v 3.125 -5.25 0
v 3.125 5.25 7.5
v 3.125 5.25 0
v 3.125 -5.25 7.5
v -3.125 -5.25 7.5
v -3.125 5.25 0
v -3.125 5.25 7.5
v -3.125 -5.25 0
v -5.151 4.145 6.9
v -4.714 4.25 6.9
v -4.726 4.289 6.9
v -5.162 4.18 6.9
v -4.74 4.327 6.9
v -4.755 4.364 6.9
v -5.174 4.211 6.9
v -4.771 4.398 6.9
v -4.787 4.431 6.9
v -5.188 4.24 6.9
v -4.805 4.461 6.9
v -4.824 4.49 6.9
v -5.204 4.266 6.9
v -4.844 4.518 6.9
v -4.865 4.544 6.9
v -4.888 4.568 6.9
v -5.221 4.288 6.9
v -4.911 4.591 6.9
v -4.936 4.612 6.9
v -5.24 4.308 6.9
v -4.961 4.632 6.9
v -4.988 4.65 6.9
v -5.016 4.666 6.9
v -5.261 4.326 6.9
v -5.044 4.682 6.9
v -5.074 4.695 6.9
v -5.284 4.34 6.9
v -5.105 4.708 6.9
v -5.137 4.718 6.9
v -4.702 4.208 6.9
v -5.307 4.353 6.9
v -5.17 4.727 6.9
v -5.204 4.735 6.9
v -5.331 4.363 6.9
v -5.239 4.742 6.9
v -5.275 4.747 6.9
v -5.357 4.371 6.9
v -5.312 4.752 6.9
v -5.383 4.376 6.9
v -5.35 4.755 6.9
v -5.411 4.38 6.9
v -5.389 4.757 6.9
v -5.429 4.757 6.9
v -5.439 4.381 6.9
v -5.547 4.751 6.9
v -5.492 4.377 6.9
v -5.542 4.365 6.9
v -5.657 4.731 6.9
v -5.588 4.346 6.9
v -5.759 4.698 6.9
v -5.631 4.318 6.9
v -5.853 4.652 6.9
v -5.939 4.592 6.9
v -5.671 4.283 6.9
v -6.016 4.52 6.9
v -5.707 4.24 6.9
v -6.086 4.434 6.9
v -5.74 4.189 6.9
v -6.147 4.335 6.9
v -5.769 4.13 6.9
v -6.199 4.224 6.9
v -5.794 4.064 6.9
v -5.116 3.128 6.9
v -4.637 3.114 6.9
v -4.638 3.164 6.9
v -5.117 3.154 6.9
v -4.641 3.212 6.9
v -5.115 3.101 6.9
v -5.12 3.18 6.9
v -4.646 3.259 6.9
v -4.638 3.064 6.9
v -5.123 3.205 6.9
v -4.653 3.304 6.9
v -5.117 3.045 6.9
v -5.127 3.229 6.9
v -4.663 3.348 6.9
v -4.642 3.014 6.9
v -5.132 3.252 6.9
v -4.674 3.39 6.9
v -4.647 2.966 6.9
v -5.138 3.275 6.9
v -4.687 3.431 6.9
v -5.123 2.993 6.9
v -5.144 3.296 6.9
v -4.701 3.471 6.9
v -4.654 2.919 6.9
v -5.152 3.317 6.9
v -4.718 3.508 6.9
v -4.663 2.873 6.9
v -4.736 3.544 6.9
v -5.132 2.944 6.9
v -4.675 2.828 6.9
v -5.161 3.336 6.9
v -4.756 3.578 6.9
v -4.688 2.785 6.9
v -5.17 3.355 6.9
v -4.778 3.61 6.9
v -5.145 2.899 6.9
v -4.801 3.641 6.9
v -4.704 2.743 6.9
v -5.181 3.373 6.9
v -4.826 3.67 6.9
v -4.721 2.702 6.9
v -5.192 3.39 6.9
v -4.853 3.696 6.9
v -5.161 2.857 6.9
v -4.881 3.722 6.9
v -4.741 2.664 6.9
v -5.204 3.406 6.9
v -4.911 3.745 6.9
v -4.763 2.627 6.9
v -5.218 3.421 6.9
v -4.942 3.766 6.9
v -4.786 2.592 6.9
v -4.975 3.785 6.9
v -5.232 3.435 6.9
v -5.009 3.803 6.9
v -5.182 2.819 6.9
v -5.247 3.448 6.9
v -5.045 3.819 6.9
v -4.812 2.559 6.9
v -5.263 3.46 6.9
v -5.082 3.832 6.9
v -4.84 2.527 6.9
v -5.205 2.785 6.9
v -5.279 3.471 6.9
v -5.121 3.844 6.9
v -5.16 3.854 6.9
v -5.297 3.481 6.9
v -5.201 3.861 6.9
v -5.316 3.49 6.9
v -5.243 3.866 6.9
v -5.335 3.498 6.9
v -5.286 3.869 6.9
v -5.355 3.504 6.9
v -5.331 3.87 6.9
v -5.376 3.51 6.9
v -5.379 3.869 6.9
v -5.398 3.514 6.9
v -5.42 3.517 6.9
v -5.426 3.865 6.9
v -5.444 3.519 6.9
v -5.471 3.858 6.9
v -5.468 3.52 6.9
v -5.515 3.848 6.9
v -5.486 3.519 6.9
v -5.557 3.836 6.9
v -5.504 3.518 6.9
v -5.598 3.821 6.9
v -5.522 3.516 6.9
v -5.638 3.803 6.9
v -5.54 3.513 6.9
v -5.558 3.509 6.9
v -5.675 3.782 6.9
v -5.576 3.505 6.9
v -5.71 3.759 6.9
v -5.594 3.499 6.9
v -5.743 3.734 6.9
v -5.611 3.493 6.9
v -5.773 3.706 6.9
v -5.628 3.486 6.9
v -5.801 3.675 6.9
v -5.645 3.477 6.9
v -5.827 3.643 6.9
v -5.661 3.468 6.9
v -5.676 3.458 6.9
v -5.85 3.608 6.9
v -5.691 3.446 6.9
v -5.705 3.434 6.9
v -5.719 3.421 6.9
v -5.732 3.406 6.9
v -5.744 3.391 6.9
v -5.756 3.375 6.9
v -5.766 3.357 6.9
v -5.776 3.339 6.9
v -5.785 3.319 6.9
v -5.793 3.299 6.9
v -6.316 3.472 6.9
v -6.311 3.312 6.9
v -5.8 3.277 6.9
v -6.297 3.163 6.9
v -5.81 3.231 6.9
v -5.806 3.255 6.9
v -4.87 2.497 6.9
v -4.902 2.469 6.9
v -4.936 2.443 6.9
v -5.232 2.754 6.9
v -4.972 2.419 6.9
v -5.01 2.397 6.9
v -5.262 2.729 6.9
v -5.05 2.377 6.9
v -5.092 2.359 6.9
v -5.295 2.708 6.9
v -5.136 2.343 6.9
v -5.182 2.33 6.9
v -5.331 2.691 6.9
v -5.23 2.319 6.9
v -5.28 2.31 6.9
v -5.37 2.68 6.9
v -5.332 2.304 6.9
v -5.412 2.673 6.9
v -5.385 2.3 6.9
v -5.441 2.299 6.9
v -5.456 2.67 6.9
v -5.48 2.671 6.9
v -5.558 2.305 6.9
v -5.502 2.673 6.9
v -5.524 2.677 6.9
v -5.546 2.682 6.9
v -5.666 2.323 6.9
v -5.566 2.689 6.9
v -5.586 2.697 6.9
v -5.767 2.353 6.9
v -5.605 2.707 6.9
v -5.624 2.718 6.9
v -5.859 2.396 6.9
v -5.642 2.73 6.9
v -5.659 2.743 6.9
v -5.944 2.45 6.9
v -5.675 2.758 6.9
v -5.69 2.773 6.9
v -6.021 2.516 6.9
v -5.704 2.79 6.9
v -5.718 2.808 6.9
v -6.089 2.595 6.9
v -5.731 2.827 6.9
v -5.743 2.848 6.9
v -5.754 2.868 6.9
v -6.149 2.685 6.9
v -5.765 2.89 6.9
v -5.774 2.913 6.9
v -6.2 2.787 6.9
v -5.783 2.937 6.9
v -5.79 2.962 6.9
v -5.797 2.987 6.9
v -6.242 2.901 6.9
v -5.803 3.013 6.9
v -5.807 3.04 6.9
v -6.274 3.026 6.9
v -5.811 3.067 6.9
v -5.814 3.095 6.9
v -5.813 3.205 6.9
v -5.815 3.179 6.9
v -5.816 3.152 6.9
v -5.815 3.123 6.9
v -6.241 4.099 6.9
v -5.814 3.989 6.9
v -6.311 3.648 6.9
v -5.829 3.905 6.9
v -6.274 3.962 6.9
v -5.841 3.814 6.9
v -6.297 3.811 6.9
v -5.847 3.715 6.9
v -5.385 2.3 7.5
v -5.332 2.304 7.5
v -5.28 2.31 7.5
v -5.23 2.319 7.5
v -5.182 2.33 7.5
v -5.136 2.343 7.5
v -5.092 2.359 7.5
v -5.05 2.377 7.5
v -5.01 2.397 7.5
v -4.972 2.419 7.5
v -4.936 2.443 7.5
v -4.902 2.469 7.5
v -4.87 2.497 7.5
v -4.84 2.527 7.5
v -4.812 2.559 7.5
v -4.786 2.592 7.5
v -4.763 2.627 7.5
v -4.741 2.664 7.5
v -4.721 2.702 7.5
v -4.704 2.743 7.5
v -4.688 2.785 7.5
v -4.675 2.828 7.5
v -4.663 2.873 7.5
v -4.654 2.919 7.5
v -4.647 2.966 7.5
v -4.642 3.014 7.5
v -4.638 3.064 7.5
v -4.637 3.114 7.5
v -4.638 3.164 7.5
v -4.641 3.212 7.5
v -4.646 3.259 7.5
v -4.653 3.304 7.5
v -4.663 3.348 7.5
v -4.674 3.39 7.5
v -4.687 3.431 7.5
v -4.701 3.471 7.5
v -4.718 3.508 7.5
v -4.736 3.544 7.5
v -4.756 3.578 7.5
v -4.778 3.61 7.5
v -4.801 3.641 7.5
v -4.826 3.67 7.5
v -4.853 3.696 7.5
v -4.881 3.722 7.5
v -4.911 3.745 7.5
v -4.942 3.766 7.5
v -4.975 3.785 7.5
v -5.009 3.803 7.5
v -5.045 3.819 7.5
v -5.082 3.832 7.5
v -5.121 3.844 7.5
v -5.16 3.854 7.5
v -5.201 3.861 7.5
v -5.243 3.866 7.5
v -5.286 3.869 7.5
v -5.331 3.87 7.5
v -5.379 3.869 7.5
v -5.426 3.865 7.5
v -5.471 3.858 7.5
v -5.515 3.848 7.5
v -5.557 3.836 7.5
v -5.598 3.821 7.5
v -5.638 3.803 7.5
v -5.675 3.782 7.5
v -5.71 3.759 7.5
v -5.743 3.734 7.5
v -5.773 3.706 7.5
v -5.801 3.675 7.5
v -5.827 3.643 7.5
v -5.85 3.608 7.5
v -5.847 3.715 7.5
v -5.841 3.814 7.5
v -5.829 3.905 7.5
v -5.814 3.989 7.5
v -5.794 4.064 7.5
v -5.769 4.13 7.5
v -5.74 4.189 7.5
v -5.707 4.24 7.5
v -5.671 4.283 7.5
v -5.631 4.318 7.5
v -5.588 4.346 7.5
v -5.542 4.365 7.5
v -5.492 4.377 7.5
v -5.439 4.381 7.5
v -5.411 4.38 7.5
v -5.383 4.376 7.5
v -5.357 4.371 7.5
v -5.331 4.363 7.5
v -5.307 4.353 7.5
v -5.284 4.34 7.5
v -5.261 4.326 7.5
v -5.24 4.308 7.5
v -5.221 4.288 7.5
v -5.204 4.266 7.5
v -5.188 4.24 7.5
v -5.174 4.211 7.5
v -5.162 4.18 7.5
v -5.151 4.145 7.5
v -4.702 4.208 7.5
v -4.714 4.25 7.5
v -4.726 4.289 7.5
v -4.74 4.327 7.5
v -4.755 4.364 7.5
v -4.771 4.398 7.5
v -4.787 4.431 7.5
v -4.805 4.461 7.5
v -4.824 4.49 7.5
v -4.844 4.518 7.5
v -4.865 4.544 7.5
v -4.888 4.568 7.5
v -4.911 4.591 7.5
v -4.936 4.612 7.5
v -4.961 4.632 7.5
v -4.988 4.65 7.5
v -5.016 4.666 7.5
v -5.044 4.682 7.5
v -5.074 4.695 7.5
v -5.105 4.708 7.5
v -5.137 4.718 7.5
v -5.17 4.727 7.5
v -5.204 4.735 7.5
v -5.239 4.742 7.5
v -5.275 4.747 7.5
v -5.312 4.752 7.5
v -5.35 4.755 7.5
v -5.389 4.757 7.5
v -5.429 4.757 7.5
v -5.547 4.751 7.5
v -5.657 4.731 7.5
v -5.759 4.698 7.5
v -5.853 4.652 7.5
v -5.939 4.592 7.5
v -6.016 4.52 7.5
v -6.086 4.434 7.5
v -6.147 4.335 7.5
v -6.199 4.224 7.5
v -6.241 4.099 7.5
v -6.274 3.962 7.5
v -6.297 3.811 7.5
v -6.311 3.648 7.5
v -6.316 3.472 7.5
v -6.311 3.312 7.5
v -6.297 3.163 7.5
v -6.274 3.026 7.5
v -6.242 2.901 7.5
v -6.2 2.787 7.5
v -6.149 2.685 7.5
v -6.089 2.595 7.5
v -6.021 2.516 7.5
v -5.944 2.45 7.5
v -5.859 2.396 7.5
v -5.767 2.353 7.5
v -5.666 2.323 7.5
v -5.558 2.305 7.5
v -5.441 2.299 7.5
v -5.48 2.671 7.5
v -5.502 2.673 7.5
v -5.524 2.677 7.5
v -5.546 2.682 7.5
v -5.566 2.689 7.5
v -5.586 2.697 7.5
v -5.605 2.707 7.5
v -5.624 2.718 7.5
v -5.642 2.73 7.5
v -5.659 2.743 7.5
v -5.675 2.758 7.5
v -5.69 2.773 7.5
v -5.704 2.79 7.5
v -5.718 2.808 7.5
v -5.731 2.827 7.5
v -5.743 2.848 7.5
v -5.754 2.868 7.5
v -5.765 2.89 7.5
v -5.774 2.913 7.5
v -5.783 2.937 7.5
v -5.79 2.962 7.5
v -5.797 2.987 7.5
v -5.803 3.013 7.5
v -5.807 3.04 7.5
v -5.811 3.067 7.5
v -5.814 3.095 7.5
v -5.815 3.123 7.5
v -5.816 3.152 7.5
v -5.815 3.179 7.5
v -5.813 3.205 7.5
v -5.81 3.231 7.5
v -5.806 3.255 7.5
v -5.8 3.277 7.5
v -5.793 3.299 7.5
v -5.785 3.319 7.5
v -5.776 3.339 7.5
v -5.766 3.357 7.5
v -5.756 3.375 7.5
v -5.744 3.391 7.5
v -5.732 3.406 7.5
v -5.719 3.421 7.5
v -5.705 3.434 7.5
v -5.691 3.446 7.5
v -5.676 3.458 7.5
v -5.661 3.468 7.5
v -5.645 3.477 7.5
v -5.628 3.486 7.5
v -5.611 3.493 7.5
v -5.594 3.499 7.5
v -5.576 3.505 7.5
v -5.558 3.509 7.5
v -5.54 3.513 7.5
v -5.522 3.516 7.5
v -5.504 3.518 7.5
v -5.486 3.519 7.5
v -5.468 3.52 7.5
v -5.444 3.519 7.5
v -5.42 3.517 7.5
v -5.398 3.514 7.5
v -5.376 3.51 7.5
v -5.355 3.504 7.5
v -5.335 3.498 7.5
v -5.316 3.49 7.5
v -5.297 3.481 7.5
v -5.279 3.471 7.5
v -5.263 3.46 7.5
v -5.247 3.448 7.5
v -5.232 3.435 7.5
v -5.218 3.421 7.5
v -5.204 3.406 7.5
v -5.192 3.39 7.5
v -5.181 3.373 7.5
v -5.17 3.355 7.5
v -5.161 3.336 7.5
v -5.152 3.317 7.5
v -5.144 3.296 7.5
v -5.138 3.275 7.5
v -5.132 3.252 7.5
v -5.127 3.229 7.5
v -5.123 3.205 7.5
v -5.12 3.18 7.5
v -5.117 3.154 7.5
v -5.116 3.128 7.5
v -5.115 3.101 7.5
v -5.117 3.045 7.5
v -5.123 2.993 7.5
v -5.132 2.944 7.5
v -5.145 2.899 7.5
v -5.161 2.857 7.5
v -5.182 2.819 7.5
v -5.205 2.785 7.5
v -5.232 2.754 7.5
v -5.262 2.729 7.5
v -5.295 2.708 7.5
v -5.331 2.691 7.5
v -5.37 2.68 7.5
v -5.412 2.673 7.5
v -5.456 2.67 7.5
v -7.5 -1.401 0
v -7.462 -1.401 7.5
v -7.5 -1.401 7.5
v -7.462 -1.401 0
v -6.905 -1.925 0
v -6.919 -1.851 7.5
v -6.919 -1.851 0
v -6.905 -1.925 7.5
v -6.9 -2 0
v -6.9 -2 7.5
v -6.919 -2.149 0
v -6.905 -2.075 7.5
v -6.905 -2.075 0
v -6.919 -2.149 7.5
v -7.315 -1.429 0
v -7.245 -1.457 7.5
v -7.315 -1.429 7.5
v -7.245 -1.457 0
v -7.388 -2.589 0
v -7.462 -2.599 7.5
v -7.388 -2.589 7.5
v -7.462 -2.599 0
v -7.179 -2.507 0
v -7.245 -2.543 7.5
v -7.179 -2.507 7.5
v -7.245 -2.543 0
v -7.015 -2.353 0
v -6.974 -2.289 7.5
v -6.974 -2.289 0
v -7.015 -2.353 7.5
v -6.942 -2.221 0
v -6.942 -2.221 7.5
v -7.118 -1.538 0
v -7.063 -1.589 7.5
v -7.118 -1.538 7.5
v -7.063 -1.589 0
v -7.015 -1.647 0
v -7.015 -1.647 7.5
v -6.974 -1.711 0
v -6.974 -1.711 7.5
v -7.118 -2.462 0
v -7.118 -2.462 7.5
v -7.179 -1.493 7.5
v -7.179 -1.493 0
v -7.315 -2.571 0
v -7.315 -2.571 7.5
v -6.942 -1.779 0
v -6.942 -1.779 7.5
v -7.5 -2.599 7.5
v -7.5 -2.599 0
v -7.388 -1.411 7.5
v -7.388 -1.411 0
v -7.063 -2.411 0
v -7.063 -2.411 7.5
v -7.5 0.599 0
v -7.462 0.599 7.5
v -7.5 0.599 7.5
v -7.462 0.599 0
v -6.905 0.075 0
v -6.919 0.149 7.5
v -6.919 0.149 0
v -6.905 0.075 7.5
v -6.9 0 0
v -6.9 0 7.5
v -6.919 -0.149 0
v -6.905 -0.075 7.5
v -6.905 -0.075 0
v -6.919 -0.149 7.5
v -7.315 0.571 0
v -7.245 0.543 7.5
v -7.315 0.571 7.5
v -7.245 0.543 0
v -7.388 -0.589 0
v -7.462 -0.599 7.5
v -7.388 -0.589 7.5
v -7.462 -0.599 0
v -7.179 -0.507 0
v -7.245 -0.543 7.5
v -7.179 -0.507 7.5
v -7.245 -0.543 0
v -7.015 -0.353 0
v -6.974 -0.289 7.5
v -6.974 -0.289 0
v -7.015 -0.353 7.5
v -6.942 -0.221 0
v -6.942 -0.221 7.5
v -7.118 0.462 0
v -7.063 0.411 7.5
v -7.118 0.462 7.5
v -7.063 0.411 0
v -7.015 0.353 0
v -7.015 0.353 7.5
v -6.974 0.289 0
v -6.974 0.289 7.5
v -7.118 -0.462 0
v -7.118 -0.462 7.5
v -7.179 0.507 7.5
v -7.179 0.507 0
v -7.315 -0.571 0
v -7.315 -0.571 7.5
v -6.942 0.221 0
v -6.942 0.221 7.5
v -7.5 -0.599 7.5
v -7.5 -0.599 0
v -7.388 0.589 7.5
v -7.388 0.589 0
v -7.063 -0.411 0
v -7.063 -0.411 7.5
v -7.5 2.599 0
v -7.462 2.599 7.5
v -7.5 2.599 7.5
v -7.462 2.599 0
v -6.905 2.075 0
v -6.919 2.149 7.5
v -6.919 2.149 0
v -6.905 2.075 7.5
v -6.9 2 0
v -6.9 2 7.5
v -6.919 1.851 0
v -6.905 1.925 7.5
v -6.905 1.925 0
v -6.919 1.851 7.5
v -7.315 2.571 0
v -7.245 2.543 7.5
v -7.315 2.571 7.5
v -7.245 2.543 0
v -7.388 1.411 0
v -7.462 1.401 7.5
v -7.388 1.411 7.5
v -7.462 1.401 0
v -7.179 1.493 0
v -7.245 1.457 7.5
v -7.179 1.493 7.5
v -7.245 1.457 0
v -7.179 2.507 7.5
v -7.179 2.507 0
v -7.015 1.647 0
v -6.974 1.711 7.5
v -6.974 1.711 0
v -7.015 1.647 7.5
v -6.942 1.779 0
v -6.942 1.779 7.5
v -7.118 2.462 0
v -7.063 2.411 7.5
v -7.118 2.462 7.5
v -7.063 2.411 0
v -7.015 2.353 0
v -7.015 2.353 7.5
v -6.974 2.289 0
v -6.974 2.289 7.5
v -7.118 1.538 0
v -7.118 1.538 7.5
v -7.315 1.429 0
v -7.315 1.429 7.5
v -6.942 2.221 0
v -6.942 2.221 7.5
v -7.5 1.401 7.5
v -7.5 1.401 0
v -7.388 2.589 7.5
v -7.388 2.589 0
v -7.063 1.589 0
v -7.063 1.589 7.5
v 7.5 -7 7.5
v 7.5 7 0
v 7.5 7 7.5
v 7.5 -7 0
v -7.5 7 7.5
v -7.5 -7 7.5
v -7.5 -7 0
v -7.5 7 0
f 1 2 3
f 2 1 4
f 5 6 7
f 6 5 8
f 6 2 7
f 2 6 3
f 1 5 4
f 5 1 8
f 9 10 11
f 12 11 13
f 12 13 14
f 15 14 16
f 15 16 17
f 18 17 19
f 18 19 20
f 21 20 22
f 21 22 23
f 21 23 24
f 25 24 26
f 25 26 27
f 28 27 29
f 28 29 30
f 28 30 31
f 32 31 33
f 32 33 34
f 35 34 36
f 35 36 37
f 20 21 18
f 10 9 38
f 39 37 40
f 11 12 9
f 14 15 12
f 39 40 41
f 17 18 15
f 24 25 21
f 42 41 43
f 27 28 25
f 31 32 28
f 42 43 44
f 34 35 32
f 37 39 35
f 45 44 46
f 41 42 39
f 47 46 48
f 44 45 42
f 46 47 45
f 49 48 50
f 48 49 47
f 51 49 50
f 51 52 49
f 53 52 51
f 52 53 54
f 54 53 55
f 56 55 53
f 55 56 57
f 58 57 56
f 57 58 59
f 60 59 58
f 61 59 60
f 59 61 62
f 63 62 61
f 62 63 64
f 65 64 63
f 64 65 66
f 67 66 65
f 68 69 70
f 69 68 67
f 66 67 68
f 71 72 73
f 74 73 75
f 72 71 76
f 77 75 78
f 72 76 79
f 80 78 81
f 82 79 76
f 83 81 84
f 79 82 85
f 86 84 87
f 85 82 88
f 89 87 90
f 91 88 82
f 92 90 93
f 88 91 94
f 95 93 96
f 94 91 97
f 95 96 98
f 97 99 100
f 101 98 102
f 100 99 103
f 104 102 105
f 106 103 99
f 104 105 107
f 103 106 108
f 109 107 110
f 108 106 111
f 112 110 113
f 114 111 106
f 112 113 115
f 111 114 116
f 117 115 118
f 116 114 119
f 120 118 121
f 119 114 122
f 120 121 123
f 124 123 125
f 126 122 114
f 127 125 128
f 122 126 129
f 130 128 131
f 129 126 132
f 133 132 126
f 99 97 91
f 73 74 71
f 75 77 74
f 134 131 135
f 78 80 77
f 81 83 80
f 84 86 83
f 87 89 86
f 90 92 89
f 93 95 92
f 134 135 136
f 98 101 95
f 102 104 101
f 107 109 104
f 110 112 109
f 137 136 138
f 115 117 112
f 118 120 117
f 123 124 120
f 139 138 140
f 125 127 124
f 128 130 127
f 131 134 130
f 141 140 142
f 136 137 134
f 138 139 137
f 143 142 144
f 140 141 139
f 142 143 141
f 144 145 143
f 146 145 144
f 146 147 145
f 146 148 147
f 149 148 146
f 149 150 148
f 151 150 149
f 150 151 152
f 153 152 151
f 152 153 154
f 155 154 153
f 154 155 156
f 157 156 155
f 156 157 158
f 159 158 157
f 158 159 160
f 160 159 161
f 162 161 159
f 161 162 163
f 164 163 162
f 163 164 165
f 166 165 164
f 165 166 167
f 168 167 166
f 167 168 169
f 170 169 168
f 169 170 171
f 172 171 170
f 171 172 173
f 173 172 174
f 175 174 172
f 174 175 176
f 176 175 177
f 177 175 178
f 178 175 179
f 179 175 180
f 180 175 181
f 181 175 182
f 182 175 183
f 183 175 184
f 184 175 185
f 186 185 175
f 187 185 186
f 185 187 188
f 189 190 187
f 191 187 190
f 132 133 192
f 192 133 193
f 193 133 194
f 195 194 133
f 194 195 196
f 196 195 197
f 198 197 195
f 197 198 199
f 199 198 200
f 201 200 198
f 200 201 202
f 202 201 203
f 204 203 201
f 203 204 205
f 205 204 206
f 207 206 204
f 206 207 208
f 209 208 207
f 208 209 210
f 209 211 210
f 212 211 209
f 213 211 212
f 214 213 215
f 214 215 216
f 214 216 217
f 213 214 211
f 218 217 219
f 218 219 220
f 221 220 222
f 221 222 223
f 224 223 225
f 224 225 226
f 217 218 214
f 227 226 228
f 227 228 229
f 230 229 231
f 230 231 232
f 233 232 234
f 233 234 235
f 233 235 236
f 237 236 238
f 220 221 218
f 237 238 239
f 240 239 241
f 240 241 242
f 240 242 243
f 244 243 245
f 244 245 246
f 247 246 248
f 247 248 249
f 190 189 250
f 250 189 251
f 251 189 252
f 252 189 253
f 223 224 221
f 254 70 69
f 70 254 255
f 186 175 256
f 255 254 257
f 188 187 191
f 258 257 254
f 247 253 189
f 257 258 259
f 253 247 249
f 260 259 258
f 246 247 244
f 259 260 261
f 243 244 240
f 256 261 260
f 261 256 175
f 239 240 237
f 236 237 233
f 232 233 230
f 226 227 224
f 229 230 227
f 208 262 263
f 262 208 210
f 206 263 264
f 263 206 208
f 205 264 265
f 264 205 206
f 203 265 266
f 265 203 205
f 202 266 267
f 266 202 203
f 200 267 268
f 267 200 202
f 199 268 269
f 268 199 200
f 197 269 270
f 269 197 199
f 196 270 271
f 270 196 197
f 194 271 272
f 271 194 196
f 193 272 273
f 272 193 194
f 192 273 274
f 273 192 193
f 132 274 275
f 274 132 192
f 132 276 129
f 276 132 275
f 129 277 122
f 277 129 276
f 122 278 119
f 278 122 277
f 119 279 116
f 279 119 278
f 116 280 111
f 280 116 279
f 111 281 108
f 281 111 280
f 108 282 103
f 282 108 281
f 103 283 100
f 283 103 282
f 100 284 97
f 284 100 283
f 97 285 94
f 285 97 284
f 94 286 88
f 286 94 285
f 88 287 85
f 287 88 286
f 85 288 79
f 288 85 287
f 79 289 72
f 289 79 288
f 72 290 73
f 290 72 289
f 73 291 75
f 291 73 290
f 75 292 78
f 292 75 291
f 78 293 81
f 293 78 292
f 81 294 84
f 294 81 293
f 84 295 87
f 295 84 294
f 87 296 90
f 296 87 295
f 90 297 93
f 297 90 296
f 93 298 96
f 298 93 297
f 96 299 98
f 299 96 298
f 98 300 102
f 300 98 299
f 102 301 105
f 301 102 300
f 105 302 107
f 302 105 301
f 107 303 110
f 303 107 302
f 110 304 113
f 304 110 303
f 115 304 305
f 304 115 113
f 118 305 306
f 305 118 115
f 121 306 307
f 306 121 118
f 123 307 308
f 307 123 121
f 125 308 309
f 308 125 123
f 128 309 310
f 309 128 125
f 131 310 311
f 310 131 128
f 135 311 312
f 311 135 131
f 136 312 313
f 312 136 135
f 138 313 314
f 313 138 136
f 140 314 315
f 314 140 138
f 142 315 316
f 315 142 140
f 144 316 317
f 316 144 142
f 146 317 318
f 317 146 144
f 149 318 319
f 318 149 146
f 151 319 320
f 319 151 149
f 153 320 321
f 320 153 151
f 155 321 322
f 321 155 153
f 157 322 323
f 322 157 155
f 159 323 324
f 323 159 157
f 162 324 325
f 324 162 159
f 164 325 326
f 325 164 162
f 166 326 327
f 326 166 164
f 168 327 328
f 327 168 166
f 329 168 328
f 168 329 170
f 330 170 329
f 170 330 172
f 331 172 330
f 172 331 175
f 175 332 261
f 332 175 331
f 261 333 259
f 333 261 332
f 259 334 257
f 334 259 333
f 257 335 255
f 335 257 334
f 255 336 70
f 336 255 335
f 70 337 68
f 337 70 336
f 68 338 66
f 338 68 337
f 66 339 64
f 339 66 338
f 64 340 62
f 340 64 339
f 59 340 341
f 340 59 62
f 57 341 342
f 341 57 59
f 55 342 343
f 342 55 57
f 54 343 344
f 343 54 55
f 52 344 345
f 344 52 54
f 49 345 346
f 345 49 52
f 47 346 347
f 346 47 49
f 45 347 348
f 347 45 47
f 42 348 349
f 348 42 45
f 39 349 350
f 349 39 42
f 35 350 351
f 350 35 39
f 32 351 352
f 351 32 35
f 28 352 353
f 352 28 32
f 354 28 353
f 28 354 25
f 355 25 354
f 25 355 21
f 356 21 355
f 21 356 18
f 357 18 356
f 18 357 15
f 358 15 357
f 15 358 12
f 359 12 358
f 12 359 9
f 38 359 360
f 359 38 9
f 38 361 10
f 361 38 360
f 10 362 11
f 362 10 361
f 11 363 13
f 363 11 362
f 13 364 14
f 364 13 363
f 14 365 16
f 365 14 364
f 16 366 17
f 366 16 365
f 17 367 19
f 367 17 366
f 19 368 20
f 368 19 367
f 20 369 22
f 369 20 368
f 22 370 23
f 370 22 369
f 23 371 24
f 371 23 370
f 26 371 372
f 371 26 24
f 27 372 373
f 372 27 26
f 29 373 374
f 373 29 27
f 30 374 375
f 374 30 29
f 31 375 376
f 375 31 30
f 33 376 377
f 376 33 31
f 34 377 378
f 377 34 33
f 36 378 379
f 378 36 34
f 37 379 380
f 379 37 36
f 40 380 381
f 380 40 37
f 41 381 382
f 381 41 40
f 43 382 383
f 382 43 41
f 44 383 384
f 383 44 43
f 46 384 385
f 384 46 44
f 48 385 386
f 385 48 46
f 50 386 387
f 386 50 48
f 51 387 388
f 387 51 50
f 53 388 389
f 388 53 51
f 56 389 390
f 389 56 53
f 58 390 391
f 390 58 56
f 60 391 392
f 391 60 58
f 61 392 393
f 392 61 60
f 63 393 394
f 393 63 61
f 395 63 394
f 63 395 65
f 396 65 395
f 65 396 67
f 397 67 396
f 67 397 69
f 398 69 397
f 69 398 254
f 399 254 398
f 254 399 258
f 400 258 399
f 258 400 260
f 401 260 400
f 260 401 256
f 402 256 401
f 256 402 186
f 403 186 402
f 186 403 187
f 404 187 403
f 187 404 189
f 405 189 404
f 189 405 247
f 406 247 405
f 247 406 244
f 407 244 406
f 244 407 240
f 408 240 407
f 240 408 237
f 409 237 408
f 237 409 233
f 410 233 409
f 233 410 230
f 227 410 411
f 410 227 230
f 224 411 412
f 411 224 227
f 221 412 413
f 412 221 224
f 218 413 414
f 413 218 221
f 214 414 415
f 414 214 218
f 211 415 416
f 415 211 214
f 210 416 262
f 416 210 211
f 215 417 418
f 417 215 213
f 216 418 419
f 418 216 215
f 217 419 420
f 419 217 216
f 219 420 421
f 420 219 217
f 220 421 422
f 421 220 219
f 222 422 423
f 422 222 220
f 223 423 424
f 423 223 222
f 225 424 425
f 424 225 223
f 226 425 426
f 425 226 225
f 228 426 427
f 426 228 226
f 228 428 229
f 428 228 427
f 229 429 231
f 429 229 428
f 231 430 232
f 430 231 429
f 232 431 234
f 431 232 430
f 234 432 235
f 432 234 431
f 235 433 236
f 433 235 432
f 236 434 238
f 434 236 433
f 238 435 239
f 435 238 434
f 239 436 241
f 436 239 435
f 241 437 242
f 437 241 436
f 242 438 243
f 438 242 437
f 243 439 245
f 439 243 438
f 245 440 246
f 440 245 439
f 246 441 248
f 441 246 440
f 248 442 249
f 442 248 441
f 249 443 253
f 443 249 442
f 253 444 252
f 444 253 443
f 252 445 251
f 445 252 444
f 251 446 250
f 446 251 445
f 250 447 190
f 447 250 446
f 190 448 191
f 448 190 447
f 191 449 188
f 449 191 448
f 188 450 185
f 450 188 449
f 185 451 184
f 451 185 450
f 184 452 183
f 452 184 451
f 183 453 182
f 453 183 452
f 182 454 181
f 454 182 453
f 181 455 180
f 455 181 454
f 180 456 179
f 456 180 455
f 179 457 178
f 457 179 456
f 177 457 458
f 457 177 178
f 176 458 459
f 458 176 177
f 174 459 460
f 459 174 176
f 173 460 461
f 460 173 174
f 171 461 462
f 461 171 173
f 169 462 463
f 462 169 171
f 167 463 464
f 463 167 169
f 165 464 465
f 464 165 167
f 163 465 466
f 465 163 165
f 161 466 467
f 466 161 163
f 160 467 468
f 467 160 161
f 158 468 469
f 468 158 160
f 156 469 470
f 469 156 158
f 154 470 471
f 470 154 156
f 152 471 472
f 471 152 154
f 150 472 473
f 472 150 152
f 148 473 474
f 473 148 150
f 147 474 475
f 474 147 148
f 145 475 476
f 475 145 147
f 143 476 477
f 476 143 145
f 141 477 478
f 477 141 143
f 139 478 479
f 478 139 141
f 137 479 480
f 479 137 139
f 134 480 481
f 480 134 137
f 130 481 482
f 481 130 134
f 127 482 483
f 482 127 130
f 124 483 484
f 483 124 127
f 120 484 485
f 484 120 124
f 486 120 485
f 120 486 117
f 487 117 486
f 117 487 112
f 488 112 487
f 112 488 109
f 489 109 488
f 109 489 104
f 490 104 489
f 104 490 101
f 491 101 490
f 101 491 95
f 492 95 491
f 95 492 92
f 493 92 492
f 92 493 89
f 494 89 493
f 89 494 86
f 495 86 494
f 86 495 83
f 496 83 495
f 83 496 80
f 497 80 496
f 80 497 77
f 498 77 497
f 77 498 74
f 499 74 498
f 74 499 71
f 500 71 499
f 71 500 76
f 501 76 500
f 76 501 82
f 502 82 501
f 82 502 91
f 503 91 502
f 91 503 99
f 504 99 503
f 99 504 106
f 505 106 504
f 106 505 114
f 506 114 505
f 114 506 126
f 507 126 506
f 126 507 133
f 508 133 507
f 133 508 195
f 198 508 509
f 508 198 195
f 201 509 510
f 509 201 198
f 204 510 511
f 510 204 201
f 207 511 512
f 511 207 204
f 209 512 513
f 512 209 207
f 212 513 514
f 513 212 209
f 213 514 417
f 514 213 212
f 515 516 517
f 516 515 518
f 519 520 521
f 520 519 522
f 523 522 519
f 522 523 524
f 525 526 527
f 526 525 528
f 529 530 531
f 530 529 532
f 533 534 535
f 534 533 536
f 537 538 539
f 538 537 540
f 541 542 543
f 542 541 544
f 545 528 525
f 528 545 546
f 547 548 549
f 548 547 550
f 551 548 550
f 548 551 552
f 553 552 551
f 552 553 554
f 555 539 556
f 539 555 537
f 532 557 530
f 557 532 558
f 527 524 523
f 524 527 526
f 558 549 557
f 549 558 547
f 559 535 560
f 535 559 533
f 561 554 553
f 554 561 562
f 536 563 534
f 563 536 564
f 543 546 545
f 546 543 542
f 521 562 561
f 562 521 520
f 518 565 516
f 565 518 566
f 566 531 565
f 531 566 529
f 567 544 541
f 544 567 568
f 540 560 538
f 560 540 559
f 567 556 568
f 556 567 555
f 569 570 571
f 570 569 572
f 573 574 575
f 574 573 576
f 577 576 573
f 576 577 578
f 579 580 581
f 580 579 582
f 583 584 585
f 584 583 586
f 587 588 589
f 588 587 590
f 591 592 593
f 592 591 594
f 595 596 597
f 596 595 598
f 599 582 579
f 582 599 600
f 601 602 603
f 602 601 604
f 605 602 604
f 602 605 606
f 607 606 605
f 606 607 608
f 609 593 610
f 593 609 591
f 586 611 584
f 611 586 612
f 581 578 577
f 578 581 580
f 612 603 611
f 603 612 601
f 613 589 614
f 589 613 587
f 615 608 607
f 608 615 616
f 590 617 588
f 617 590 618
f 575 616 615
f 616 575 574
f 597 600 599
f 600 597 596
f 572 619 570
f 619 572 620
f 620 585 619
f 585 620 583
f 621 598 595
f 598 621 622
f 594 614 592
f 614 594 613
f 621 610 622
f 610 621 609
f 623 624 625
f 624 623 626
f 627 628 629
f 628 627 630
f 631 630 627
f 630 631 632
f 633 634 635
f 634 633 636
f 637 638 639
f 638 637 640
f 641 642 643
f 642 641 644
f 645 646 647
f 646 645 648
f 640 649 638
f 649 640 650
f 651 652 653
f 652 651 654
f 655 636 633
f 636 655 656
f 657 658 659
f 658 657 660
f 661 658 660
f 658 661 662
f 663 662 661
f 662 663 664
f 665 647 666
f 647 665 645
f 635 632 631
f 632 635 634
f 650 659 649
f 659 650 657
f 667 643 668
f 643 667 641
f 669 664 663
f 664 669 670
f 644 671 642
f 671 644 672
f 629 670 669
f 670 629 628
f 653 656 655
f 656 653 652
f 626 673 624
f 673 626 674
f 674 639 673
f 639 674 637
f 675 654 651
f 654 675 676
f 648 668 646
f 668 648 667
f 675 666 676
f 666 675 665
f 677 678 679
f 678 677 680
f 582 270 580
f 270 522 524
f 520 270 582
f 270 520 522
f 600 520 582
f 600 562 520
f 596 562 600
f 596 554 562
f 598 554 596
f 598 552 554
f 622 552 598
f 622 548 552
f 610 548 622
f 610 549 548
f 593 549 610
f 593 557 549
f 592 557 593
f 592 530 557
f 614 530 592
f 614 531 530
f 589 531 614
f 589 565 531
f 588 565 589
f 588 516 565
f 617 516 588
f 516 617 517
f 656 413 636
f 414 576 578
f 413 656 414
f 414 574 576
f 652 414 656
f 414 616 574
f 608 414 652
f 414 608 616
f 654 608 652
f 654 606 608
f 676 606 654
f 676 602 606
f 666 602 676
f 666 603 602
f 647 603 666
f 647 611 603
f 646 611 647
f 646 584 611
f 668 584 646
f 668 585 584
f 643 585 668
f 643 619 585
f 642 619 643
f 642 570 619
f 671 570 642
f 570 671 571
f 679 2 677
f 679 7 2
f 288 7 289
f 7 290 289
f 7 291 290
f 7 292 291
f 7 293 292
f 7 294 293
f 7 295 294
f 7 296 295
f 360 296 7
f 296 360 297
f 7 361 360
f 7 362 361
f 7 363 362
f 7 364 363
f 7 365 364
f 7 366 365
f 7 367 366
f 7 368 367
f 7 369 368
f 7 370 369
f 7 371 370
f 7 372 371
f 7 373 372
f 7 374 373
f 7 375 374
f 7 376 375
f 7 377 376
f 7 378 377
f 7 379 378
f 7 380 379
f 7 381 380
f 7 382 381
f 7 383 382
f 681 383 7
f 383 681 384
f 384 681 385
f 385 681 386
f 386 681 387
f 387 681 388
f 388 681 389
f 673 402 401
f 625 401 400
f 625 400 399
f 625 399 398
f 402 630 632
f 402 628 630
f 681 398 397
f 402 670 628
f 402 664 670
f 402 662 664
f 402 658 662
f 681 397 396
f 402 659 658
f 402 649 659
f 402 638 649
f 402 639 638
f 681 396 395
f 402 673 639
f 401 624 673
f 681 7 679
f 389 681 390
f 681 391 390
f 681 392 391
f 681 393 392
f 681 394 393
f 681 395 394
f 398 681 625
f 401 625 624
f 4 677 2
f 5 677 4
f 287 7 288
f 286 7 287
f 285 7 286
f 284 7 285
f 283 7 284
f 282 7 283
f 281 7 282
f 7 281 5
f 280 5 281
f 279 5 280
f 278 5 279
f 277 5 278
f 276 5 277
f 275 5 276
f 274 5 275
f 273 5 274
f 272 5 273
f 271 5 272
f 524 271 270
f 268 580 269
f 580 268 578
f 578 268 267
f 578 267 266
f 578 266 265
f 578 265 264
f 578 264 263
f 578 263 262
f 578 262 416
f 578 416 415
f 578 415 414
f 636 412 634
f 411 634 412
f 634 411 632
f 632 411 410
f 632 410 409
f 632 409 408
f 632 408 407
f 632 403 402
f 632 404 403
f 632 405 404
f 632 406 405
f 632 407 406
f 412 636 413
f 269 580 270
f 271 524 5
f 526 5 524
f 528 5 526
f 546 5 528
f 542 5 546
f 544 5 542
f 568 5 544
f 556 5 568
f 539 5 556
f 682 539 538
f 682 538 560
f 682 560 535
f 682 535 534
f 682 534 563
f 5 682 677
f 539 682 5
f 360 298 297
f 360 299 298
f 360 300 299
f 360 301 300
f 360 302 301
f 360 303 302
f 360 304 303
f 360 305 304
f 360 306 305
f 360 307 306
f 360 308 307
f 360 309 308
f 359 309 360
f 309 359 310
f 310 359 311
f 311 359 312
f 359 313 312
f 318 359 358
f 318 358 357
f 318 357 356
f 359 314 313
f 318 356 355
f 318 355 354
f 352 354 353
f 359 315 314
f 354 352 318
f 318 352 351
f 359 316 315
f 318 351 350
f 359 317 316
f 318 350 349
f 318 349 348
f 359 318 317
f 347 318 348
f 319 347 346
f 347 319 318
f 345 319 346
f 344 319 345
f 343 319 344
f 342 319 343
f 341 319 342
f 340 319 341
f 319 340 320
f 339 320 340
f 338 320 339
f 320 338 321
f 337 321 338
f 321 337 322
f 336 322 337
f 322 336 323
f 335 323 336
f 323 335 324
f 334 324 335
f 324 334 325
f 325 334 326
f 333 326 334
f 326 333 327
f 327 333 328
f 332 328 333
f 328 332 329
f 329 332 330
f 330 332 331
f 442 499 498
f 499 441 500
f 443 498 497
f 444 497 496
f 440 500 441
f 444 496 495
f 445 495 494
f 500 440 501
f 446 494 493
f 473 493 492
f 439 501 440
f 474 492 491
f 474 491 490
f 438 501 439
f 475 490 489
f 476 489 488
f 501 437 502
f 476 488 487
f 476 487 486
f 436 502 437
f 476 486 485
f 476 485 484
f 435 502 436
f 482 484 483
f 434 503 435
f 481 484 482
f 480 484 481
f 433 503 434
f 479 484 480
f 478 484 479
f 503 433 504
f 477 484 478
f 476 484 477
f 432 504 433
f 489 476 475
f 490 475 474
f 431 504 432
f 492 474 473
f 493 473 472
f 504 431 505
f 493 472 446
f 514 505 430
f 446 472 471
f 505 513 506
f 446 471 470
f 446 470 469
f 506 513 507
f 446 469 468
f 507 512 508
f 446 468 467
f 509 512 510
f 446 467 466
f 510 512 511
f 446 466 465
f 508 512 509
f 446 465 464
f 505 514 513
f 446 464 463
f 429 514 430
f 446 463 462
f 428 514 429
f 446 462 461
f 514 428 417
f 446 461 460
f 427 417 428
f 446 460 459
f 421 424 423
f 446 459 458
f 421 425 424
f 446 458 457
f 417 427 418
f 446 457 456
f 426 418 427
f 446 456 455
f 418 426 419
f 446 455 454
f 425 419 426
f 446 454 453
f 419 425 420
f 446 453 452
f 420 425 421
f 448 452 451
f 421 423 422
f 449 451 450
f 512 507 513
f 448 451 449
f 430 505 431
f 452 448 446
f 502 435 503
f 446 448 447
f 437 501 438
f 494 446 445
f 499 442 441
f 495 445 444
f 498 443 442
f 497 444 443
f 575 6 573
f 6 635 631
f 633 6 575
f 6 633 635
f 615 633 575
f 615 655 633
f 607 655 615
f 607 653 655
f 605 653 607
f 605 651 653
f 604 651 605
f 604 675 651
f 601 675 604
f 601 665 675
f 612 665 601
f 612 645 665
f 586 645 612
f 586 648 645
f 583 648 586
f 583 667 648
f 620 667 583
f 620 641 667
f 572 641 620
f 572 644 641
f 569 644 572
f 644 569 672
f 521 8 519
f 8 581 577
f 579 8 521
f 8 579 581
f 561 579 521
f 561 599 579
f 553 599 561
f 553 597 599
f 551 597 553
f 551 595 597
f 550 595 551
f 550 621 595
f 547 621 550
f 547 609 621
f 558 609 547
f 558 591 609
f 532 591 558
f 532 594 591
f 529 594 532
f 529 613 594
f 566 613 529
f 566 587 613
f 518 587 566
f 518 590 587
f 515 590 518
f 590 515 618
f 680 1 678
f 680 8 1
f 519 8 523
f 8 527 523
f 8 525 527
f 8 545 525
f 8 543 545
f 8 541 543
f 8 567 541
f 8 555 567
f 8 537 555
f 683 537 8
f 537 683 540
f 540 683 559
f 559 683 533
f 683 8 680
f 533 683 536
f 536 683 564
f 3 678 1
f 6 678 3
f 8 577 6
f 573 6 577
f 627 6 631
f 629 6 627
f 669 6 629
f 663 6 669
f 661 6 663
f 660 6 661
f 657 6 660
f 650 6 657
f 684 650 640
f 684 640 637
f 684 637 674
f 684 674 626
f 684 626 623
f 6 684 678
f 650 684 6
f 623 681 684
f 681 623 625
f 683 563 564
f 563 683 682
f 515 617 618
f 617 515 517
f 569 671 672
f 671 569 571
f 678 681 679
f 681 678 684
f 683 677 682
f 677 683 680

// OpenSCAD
$fn = 50;

difference() {
	union() {
		translate(v = [0, -5, 0]) {
			rotate(a = [0, 0, 0]) {
				difference() {
					union() {
						translate(v = [-7.5, -2.0, 0]) {
							cube(size = [15.0, 14.0, 7.5]);
						}
					}
					union() {
						translate(v = [-3.125, -0.25, -0.1]) {
							cube(size = [6.25, 10.5, 7.7]);
						}
						translate(v = [-5.5, 8.5, 6.9]) {
							linear_extrude(height = 0.7) {
								text(font = "Arial:style=Bold", halign = "center", size = 2.5, text = "6", valign = "center");
							}
						}
						translate(v = [-7.5, 3, -0.1]) {
							cylinder(h = 7.7, r = 0.6);
						}
						translate(v = [-7.5, 5, -0.1]) {
							cylinder(h = 7.7, r = 0.6);
						}
						translate(v = [-7.5, 7, -0.1]) {
							cylinder(h = 7.7, r = 0.6);
						}
					}
				}
			}
		}
	}
	union();
}
